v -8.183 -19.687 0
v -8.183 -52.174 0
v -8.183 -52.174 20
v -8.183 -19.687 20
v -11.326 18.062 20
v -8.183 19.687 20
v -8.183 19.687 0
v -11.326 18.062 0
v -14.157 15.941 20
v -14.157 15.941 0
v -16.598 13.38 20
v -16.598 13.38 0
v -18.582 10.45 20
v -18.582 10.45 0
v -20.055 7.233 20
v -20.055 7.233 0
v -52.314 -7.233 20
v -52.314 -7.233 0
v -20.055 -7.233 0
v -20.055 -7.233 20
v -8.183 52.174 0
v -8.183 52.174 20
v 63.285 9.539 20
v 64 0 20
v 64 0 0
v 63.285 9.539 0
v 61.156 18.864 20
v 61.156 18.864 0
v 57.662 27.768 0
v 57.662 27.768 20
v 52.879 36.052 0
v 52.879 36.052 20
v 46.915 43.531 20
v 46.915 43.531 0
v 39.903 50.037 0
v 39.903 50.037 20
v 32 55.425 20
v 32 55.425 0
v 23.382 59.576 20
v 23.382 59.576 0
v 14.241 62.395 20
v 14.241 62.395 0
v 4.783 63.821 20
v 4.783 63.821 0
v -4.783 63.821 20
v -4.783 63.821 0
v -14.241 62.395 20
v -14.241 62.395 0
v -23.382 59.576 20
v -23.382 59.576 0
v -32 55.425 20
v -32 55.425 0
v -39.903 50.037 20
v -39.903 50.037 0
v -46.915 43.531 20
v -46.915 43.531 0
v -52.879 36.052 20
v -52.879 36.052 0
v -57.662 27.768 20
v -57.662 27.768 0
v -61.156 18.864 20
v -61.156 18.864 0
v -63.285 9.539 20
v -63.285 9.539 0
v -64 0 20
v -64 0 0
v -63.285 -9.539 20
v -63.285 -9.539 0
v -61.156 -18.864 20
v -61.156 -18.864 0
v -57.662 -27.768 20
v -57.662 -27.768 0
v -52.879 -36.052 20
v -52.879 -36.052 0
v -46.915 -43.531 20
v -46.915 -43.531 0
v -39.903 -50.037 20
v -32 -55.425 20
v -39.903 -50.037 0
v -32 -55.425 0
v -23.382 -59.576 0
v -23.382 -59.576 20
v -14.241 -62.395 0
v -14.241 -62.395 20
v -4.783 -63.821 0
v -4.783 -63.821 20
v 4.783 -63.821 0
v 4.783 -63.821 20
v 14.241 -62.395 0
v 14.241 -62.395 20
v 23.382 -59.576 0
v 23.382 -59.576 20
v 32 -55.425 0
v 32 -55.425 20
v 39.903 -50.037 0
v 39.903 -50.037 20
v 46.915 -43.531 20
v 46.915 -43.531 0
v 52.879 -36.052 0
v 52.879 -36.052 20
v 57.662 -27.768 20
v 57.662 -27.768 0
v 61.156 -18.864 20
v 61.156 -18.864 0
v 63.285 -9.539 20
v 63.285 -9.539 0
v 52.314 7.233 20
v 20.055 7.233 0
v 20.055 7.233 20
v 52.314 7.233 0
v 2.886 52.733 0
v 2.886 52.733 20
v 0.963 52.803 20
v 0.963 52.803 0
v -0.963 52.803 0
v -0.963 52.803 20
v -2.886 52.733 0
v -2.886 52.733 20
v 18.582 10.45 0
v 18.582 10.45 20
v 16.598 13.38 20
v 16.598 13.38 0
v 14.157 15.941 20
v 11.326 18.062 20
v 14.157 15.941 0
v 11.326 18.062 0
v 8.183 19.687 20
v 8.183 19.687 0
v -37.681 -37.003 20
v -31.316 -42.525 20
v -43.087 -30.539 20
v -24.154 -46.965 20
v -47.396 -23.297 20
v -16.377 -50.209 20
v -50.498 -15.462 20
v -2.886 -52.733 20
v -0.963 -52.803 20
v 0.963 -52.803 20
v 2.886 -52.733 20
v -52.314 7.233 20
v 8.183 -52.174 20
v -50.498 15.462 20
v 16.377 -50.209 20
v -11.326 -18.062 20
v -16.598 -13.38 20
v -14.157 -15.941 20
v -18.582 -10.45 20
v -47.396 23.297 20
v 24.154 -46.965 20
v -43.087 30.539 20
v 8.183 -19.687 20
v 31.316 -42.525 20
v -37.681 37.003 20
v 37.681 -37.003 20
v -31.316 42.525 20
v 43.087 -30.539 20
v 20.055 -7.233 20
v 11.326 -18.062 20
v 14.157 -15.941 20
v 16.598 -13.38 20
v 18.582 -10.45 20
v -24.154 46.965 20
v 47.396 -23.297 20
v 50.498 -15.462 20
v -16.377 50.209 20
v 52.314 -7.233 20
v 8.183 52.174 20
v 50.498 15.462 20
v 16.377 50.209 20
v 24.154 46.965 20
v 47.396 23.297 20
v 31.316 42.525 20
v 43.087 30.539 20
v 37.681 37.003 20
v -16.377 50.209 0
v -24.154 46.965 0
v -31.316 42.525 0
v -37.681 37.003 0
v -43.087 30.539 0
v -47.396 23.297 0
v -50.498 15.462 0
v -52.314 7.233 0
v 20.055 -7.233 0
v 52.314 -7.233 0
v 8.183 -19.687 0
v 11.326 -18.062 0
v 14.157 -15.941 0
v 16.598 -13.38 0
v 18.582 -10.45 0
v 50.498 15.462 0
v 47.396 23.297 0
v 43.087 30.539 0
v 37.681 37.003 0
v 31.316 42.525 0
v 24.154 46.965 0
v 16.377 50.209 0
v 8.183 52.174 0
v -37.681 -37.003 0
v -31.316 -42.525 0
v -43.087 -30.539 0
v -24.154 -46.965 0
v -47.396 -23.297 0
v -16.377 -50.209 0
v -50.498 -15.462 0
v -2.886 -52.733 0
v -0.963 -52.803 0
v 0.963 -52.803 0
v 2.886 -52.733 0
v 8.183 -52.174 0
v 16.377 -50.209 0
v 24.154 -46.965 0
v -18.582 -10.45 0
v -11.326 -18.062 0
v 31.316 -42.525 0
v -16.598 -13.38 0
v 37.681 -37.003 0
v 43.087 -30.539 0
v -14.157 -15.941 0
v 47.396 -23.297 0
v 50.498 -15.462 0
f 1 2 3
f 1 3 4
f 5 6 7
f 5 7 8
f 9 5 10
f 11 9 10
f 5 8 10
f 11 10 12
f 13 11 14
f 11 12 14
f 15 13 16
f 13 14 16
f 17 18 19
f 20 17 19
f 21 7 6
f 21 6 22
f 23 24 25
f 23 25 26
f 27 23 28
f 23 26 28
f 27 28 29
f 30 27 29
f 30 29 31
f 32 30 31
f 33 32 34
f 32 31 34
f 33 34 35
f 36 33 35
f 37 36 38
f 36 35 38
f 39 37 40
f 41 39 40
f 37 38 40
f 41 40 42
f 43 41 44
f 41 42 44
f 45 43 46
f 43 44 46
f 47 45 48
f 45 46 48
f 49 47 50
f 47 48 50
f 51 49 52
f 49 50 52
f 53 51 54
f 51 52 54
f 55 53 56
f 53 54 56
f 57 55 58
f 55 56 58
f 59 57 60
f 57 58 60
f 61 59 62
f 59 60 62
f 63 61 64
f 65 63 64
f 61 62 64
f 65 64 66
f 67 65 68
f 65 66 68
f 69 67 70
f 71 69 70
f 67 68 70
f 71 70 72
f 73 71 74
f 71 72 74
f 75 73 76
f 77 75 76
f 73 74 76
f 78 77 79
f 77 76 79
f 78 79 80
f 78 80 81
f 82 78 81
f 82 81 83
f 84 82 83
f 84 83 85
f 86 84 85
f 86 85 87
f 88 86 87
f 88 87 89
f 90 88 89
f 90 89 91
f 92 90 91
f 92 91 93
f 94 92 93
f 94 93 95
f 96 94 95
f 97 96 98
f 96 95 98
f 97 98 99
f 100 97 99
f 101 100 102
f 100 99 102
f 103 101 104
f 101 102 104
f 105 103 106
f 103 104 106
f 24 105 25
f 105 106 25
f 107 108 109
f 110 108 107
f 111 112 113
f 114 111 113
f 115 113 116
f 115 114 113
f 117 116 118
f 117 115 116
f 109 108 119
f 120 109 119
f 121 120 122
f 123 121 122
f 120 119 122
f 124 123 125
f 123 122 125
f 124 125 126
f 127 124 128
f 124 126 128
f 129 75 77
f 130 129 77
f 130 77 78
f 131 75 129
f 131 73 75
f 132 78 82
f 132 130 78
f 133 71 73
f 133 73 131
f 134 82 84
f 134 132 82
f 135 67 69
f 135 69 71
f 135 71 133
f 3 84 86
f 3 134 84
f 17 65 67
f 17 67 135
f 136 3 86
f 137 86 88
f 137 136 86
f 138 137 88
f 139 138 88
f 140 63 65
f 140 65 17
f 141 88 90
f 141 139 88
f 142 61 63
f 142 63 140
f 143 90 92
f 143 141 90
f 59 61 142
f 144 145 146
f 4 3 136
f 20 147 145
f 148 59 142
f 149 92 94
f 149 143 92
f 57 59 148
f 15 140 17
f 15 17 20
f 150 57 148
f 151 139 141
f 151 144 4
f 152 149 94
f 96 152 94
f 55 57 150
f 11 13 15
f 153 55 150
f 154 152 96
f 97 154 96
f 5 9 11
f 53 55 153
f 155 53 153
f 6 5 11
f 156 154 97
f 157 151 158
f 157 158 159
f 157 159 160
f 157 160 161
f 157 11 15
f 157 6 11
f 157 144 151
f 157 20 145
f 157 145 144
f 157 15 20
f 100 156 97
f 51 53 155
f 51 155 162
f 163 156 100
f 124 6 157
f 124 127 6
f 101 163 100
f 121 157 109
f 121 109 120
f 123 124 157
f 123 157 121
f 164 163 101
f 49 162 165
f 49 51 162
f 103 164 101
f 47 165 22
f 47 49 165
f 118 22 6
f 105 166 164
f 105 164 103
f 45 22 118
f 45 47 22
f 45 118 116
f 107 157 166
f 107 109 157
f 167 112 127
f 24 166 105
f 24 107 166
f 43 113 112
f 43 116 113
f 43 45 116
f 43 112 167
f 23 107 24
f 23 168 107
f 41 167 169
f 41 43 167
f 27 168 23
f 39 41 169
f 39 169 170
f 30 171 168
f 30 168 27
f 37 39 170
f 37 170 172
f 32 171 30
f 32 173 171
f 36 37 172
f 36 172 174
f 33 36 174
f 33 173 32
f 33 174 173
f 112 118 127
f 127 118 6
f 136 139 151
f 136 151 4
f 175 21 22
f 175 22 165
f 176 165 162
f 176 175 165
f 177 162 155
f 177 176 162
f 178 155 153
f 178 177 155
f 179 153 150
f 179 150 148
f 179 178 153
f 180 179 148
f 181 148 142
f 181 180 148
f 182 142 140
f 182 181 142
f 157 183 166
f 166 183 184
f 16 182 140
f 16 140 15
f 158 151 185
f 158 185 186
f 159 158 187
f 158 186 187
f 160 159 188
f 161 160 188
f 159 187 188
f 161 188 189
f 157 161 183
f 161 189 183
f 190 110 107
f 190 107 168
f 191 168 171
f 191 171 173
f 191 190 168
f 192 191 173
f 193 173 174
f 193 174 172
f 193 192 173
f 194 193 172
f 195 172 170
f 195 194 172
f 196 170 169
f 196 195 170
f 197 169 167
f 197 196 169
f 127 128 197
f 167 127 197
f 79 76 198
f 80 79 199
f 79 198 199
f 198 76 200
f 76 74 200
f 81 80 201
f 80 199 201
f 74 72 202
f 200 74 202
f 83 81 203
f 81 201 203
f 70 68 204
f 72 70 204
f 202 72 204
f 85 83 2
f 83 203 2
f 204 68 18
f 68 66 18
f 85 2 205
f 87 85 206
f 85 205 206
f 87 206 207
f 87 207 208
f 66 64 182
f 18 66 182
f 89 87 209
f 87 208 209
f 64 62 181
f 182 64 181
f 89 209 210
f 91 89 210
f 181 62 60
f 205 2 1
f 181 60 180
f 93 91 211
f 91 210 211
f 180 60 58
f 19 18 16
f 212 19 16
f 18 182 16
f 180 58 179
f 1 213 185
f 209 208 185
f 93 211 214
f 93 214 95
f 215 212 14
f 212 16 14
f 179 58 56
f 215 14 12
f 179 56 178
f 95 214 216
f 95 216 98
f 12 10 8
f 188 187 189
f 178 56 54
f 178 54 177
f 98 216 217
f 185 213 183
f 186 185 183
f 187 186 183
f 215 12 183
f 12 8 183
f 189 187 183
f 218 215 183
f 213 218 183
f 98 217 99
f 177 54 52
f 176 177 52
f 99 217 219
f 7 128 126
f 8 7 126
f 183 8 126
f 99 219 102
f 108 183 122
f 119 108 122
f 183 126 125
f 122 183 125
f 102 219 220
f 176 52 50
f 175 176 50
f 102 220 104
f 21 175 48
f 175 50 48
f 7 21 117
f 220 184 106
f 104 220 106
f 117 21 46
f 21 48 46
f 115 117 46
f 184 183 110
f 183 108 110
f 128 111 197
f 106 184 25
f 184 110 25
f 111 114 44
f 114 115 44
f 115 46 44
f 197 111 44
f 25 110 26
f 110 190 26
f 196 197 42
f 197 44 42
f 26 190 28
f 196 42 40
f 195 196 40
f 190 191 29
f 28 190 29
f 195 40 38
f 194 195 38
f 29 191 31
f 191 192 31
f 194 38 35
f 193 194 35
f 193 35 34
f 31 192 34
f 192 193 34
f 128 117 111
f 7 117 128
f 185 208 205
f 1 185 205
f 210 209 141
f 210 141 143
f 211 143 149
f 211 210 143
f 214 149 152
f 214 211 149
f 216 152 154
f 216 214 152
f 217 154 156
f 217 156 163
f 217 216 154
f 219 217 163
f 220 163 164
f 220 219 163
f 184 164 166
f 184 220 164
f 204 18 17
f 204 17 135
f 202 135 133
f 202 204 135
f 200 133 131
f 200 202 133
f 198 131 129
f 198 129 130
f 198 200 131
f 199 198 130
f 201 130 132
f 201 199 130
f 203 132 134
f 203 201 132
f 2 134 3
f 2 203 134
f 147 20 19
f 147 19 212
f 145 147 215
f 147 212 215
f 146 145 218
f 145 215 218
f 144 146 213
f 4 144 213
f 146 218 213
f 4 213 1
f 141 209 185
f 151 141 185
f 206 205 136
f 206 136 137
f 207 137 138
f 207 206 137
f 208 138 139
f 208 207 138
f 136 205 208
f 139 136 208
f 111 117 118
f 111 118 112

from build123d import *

# Parameters (mm, degrees)
F0_R     = 63.9996610984
F0_R_2   = 52.8119822493
F1_DEPTH = 20
F2_R     = 21.3194523792
F3_DEPTH = 20
F5_W     = 44.8123216629
F5_H     = 14.4665837288
F4_W     = 16.3650214672
F4_H     = 105.4660975933
F6_DEPTH = 20


with BuildPart() as f1:
    # F0 (on Top) → F1 (new body)
    with BuildSketch(Plane.XY):
        Circle(F0_R)
        Circle(F0_R_2, mode=Mode.SUBTRACT)
    extrude(amount=F1_DEPTH)



with BuildPart() as f3:
    # F2 (on Top) → F3 (new body)
    with BuildSketch(Plane.XY):
        Circle(F2_R)
    extrude(amount=F3_DEPTH)


with BuildPart() as f1_1:
    add(f1.part)

    add(f3.part)  # F6 merges F3
    # F5 (on face) + F4 (on Top) → F6 (join)
    with BuildSketch(Plane.XY):
        with Locations((-30.5886715651, 0)):
            Rectangle(F5_W, F5_H)
        with Locations((30.5886715651, 0)):
            Rectangle(F5_W, F5_H)
    with BuildSketch(Plane.XY):
        Rectangle(F4_W, F4_H)
    extrude(amount=F6_DEPTH)


solid = f1_1.part
